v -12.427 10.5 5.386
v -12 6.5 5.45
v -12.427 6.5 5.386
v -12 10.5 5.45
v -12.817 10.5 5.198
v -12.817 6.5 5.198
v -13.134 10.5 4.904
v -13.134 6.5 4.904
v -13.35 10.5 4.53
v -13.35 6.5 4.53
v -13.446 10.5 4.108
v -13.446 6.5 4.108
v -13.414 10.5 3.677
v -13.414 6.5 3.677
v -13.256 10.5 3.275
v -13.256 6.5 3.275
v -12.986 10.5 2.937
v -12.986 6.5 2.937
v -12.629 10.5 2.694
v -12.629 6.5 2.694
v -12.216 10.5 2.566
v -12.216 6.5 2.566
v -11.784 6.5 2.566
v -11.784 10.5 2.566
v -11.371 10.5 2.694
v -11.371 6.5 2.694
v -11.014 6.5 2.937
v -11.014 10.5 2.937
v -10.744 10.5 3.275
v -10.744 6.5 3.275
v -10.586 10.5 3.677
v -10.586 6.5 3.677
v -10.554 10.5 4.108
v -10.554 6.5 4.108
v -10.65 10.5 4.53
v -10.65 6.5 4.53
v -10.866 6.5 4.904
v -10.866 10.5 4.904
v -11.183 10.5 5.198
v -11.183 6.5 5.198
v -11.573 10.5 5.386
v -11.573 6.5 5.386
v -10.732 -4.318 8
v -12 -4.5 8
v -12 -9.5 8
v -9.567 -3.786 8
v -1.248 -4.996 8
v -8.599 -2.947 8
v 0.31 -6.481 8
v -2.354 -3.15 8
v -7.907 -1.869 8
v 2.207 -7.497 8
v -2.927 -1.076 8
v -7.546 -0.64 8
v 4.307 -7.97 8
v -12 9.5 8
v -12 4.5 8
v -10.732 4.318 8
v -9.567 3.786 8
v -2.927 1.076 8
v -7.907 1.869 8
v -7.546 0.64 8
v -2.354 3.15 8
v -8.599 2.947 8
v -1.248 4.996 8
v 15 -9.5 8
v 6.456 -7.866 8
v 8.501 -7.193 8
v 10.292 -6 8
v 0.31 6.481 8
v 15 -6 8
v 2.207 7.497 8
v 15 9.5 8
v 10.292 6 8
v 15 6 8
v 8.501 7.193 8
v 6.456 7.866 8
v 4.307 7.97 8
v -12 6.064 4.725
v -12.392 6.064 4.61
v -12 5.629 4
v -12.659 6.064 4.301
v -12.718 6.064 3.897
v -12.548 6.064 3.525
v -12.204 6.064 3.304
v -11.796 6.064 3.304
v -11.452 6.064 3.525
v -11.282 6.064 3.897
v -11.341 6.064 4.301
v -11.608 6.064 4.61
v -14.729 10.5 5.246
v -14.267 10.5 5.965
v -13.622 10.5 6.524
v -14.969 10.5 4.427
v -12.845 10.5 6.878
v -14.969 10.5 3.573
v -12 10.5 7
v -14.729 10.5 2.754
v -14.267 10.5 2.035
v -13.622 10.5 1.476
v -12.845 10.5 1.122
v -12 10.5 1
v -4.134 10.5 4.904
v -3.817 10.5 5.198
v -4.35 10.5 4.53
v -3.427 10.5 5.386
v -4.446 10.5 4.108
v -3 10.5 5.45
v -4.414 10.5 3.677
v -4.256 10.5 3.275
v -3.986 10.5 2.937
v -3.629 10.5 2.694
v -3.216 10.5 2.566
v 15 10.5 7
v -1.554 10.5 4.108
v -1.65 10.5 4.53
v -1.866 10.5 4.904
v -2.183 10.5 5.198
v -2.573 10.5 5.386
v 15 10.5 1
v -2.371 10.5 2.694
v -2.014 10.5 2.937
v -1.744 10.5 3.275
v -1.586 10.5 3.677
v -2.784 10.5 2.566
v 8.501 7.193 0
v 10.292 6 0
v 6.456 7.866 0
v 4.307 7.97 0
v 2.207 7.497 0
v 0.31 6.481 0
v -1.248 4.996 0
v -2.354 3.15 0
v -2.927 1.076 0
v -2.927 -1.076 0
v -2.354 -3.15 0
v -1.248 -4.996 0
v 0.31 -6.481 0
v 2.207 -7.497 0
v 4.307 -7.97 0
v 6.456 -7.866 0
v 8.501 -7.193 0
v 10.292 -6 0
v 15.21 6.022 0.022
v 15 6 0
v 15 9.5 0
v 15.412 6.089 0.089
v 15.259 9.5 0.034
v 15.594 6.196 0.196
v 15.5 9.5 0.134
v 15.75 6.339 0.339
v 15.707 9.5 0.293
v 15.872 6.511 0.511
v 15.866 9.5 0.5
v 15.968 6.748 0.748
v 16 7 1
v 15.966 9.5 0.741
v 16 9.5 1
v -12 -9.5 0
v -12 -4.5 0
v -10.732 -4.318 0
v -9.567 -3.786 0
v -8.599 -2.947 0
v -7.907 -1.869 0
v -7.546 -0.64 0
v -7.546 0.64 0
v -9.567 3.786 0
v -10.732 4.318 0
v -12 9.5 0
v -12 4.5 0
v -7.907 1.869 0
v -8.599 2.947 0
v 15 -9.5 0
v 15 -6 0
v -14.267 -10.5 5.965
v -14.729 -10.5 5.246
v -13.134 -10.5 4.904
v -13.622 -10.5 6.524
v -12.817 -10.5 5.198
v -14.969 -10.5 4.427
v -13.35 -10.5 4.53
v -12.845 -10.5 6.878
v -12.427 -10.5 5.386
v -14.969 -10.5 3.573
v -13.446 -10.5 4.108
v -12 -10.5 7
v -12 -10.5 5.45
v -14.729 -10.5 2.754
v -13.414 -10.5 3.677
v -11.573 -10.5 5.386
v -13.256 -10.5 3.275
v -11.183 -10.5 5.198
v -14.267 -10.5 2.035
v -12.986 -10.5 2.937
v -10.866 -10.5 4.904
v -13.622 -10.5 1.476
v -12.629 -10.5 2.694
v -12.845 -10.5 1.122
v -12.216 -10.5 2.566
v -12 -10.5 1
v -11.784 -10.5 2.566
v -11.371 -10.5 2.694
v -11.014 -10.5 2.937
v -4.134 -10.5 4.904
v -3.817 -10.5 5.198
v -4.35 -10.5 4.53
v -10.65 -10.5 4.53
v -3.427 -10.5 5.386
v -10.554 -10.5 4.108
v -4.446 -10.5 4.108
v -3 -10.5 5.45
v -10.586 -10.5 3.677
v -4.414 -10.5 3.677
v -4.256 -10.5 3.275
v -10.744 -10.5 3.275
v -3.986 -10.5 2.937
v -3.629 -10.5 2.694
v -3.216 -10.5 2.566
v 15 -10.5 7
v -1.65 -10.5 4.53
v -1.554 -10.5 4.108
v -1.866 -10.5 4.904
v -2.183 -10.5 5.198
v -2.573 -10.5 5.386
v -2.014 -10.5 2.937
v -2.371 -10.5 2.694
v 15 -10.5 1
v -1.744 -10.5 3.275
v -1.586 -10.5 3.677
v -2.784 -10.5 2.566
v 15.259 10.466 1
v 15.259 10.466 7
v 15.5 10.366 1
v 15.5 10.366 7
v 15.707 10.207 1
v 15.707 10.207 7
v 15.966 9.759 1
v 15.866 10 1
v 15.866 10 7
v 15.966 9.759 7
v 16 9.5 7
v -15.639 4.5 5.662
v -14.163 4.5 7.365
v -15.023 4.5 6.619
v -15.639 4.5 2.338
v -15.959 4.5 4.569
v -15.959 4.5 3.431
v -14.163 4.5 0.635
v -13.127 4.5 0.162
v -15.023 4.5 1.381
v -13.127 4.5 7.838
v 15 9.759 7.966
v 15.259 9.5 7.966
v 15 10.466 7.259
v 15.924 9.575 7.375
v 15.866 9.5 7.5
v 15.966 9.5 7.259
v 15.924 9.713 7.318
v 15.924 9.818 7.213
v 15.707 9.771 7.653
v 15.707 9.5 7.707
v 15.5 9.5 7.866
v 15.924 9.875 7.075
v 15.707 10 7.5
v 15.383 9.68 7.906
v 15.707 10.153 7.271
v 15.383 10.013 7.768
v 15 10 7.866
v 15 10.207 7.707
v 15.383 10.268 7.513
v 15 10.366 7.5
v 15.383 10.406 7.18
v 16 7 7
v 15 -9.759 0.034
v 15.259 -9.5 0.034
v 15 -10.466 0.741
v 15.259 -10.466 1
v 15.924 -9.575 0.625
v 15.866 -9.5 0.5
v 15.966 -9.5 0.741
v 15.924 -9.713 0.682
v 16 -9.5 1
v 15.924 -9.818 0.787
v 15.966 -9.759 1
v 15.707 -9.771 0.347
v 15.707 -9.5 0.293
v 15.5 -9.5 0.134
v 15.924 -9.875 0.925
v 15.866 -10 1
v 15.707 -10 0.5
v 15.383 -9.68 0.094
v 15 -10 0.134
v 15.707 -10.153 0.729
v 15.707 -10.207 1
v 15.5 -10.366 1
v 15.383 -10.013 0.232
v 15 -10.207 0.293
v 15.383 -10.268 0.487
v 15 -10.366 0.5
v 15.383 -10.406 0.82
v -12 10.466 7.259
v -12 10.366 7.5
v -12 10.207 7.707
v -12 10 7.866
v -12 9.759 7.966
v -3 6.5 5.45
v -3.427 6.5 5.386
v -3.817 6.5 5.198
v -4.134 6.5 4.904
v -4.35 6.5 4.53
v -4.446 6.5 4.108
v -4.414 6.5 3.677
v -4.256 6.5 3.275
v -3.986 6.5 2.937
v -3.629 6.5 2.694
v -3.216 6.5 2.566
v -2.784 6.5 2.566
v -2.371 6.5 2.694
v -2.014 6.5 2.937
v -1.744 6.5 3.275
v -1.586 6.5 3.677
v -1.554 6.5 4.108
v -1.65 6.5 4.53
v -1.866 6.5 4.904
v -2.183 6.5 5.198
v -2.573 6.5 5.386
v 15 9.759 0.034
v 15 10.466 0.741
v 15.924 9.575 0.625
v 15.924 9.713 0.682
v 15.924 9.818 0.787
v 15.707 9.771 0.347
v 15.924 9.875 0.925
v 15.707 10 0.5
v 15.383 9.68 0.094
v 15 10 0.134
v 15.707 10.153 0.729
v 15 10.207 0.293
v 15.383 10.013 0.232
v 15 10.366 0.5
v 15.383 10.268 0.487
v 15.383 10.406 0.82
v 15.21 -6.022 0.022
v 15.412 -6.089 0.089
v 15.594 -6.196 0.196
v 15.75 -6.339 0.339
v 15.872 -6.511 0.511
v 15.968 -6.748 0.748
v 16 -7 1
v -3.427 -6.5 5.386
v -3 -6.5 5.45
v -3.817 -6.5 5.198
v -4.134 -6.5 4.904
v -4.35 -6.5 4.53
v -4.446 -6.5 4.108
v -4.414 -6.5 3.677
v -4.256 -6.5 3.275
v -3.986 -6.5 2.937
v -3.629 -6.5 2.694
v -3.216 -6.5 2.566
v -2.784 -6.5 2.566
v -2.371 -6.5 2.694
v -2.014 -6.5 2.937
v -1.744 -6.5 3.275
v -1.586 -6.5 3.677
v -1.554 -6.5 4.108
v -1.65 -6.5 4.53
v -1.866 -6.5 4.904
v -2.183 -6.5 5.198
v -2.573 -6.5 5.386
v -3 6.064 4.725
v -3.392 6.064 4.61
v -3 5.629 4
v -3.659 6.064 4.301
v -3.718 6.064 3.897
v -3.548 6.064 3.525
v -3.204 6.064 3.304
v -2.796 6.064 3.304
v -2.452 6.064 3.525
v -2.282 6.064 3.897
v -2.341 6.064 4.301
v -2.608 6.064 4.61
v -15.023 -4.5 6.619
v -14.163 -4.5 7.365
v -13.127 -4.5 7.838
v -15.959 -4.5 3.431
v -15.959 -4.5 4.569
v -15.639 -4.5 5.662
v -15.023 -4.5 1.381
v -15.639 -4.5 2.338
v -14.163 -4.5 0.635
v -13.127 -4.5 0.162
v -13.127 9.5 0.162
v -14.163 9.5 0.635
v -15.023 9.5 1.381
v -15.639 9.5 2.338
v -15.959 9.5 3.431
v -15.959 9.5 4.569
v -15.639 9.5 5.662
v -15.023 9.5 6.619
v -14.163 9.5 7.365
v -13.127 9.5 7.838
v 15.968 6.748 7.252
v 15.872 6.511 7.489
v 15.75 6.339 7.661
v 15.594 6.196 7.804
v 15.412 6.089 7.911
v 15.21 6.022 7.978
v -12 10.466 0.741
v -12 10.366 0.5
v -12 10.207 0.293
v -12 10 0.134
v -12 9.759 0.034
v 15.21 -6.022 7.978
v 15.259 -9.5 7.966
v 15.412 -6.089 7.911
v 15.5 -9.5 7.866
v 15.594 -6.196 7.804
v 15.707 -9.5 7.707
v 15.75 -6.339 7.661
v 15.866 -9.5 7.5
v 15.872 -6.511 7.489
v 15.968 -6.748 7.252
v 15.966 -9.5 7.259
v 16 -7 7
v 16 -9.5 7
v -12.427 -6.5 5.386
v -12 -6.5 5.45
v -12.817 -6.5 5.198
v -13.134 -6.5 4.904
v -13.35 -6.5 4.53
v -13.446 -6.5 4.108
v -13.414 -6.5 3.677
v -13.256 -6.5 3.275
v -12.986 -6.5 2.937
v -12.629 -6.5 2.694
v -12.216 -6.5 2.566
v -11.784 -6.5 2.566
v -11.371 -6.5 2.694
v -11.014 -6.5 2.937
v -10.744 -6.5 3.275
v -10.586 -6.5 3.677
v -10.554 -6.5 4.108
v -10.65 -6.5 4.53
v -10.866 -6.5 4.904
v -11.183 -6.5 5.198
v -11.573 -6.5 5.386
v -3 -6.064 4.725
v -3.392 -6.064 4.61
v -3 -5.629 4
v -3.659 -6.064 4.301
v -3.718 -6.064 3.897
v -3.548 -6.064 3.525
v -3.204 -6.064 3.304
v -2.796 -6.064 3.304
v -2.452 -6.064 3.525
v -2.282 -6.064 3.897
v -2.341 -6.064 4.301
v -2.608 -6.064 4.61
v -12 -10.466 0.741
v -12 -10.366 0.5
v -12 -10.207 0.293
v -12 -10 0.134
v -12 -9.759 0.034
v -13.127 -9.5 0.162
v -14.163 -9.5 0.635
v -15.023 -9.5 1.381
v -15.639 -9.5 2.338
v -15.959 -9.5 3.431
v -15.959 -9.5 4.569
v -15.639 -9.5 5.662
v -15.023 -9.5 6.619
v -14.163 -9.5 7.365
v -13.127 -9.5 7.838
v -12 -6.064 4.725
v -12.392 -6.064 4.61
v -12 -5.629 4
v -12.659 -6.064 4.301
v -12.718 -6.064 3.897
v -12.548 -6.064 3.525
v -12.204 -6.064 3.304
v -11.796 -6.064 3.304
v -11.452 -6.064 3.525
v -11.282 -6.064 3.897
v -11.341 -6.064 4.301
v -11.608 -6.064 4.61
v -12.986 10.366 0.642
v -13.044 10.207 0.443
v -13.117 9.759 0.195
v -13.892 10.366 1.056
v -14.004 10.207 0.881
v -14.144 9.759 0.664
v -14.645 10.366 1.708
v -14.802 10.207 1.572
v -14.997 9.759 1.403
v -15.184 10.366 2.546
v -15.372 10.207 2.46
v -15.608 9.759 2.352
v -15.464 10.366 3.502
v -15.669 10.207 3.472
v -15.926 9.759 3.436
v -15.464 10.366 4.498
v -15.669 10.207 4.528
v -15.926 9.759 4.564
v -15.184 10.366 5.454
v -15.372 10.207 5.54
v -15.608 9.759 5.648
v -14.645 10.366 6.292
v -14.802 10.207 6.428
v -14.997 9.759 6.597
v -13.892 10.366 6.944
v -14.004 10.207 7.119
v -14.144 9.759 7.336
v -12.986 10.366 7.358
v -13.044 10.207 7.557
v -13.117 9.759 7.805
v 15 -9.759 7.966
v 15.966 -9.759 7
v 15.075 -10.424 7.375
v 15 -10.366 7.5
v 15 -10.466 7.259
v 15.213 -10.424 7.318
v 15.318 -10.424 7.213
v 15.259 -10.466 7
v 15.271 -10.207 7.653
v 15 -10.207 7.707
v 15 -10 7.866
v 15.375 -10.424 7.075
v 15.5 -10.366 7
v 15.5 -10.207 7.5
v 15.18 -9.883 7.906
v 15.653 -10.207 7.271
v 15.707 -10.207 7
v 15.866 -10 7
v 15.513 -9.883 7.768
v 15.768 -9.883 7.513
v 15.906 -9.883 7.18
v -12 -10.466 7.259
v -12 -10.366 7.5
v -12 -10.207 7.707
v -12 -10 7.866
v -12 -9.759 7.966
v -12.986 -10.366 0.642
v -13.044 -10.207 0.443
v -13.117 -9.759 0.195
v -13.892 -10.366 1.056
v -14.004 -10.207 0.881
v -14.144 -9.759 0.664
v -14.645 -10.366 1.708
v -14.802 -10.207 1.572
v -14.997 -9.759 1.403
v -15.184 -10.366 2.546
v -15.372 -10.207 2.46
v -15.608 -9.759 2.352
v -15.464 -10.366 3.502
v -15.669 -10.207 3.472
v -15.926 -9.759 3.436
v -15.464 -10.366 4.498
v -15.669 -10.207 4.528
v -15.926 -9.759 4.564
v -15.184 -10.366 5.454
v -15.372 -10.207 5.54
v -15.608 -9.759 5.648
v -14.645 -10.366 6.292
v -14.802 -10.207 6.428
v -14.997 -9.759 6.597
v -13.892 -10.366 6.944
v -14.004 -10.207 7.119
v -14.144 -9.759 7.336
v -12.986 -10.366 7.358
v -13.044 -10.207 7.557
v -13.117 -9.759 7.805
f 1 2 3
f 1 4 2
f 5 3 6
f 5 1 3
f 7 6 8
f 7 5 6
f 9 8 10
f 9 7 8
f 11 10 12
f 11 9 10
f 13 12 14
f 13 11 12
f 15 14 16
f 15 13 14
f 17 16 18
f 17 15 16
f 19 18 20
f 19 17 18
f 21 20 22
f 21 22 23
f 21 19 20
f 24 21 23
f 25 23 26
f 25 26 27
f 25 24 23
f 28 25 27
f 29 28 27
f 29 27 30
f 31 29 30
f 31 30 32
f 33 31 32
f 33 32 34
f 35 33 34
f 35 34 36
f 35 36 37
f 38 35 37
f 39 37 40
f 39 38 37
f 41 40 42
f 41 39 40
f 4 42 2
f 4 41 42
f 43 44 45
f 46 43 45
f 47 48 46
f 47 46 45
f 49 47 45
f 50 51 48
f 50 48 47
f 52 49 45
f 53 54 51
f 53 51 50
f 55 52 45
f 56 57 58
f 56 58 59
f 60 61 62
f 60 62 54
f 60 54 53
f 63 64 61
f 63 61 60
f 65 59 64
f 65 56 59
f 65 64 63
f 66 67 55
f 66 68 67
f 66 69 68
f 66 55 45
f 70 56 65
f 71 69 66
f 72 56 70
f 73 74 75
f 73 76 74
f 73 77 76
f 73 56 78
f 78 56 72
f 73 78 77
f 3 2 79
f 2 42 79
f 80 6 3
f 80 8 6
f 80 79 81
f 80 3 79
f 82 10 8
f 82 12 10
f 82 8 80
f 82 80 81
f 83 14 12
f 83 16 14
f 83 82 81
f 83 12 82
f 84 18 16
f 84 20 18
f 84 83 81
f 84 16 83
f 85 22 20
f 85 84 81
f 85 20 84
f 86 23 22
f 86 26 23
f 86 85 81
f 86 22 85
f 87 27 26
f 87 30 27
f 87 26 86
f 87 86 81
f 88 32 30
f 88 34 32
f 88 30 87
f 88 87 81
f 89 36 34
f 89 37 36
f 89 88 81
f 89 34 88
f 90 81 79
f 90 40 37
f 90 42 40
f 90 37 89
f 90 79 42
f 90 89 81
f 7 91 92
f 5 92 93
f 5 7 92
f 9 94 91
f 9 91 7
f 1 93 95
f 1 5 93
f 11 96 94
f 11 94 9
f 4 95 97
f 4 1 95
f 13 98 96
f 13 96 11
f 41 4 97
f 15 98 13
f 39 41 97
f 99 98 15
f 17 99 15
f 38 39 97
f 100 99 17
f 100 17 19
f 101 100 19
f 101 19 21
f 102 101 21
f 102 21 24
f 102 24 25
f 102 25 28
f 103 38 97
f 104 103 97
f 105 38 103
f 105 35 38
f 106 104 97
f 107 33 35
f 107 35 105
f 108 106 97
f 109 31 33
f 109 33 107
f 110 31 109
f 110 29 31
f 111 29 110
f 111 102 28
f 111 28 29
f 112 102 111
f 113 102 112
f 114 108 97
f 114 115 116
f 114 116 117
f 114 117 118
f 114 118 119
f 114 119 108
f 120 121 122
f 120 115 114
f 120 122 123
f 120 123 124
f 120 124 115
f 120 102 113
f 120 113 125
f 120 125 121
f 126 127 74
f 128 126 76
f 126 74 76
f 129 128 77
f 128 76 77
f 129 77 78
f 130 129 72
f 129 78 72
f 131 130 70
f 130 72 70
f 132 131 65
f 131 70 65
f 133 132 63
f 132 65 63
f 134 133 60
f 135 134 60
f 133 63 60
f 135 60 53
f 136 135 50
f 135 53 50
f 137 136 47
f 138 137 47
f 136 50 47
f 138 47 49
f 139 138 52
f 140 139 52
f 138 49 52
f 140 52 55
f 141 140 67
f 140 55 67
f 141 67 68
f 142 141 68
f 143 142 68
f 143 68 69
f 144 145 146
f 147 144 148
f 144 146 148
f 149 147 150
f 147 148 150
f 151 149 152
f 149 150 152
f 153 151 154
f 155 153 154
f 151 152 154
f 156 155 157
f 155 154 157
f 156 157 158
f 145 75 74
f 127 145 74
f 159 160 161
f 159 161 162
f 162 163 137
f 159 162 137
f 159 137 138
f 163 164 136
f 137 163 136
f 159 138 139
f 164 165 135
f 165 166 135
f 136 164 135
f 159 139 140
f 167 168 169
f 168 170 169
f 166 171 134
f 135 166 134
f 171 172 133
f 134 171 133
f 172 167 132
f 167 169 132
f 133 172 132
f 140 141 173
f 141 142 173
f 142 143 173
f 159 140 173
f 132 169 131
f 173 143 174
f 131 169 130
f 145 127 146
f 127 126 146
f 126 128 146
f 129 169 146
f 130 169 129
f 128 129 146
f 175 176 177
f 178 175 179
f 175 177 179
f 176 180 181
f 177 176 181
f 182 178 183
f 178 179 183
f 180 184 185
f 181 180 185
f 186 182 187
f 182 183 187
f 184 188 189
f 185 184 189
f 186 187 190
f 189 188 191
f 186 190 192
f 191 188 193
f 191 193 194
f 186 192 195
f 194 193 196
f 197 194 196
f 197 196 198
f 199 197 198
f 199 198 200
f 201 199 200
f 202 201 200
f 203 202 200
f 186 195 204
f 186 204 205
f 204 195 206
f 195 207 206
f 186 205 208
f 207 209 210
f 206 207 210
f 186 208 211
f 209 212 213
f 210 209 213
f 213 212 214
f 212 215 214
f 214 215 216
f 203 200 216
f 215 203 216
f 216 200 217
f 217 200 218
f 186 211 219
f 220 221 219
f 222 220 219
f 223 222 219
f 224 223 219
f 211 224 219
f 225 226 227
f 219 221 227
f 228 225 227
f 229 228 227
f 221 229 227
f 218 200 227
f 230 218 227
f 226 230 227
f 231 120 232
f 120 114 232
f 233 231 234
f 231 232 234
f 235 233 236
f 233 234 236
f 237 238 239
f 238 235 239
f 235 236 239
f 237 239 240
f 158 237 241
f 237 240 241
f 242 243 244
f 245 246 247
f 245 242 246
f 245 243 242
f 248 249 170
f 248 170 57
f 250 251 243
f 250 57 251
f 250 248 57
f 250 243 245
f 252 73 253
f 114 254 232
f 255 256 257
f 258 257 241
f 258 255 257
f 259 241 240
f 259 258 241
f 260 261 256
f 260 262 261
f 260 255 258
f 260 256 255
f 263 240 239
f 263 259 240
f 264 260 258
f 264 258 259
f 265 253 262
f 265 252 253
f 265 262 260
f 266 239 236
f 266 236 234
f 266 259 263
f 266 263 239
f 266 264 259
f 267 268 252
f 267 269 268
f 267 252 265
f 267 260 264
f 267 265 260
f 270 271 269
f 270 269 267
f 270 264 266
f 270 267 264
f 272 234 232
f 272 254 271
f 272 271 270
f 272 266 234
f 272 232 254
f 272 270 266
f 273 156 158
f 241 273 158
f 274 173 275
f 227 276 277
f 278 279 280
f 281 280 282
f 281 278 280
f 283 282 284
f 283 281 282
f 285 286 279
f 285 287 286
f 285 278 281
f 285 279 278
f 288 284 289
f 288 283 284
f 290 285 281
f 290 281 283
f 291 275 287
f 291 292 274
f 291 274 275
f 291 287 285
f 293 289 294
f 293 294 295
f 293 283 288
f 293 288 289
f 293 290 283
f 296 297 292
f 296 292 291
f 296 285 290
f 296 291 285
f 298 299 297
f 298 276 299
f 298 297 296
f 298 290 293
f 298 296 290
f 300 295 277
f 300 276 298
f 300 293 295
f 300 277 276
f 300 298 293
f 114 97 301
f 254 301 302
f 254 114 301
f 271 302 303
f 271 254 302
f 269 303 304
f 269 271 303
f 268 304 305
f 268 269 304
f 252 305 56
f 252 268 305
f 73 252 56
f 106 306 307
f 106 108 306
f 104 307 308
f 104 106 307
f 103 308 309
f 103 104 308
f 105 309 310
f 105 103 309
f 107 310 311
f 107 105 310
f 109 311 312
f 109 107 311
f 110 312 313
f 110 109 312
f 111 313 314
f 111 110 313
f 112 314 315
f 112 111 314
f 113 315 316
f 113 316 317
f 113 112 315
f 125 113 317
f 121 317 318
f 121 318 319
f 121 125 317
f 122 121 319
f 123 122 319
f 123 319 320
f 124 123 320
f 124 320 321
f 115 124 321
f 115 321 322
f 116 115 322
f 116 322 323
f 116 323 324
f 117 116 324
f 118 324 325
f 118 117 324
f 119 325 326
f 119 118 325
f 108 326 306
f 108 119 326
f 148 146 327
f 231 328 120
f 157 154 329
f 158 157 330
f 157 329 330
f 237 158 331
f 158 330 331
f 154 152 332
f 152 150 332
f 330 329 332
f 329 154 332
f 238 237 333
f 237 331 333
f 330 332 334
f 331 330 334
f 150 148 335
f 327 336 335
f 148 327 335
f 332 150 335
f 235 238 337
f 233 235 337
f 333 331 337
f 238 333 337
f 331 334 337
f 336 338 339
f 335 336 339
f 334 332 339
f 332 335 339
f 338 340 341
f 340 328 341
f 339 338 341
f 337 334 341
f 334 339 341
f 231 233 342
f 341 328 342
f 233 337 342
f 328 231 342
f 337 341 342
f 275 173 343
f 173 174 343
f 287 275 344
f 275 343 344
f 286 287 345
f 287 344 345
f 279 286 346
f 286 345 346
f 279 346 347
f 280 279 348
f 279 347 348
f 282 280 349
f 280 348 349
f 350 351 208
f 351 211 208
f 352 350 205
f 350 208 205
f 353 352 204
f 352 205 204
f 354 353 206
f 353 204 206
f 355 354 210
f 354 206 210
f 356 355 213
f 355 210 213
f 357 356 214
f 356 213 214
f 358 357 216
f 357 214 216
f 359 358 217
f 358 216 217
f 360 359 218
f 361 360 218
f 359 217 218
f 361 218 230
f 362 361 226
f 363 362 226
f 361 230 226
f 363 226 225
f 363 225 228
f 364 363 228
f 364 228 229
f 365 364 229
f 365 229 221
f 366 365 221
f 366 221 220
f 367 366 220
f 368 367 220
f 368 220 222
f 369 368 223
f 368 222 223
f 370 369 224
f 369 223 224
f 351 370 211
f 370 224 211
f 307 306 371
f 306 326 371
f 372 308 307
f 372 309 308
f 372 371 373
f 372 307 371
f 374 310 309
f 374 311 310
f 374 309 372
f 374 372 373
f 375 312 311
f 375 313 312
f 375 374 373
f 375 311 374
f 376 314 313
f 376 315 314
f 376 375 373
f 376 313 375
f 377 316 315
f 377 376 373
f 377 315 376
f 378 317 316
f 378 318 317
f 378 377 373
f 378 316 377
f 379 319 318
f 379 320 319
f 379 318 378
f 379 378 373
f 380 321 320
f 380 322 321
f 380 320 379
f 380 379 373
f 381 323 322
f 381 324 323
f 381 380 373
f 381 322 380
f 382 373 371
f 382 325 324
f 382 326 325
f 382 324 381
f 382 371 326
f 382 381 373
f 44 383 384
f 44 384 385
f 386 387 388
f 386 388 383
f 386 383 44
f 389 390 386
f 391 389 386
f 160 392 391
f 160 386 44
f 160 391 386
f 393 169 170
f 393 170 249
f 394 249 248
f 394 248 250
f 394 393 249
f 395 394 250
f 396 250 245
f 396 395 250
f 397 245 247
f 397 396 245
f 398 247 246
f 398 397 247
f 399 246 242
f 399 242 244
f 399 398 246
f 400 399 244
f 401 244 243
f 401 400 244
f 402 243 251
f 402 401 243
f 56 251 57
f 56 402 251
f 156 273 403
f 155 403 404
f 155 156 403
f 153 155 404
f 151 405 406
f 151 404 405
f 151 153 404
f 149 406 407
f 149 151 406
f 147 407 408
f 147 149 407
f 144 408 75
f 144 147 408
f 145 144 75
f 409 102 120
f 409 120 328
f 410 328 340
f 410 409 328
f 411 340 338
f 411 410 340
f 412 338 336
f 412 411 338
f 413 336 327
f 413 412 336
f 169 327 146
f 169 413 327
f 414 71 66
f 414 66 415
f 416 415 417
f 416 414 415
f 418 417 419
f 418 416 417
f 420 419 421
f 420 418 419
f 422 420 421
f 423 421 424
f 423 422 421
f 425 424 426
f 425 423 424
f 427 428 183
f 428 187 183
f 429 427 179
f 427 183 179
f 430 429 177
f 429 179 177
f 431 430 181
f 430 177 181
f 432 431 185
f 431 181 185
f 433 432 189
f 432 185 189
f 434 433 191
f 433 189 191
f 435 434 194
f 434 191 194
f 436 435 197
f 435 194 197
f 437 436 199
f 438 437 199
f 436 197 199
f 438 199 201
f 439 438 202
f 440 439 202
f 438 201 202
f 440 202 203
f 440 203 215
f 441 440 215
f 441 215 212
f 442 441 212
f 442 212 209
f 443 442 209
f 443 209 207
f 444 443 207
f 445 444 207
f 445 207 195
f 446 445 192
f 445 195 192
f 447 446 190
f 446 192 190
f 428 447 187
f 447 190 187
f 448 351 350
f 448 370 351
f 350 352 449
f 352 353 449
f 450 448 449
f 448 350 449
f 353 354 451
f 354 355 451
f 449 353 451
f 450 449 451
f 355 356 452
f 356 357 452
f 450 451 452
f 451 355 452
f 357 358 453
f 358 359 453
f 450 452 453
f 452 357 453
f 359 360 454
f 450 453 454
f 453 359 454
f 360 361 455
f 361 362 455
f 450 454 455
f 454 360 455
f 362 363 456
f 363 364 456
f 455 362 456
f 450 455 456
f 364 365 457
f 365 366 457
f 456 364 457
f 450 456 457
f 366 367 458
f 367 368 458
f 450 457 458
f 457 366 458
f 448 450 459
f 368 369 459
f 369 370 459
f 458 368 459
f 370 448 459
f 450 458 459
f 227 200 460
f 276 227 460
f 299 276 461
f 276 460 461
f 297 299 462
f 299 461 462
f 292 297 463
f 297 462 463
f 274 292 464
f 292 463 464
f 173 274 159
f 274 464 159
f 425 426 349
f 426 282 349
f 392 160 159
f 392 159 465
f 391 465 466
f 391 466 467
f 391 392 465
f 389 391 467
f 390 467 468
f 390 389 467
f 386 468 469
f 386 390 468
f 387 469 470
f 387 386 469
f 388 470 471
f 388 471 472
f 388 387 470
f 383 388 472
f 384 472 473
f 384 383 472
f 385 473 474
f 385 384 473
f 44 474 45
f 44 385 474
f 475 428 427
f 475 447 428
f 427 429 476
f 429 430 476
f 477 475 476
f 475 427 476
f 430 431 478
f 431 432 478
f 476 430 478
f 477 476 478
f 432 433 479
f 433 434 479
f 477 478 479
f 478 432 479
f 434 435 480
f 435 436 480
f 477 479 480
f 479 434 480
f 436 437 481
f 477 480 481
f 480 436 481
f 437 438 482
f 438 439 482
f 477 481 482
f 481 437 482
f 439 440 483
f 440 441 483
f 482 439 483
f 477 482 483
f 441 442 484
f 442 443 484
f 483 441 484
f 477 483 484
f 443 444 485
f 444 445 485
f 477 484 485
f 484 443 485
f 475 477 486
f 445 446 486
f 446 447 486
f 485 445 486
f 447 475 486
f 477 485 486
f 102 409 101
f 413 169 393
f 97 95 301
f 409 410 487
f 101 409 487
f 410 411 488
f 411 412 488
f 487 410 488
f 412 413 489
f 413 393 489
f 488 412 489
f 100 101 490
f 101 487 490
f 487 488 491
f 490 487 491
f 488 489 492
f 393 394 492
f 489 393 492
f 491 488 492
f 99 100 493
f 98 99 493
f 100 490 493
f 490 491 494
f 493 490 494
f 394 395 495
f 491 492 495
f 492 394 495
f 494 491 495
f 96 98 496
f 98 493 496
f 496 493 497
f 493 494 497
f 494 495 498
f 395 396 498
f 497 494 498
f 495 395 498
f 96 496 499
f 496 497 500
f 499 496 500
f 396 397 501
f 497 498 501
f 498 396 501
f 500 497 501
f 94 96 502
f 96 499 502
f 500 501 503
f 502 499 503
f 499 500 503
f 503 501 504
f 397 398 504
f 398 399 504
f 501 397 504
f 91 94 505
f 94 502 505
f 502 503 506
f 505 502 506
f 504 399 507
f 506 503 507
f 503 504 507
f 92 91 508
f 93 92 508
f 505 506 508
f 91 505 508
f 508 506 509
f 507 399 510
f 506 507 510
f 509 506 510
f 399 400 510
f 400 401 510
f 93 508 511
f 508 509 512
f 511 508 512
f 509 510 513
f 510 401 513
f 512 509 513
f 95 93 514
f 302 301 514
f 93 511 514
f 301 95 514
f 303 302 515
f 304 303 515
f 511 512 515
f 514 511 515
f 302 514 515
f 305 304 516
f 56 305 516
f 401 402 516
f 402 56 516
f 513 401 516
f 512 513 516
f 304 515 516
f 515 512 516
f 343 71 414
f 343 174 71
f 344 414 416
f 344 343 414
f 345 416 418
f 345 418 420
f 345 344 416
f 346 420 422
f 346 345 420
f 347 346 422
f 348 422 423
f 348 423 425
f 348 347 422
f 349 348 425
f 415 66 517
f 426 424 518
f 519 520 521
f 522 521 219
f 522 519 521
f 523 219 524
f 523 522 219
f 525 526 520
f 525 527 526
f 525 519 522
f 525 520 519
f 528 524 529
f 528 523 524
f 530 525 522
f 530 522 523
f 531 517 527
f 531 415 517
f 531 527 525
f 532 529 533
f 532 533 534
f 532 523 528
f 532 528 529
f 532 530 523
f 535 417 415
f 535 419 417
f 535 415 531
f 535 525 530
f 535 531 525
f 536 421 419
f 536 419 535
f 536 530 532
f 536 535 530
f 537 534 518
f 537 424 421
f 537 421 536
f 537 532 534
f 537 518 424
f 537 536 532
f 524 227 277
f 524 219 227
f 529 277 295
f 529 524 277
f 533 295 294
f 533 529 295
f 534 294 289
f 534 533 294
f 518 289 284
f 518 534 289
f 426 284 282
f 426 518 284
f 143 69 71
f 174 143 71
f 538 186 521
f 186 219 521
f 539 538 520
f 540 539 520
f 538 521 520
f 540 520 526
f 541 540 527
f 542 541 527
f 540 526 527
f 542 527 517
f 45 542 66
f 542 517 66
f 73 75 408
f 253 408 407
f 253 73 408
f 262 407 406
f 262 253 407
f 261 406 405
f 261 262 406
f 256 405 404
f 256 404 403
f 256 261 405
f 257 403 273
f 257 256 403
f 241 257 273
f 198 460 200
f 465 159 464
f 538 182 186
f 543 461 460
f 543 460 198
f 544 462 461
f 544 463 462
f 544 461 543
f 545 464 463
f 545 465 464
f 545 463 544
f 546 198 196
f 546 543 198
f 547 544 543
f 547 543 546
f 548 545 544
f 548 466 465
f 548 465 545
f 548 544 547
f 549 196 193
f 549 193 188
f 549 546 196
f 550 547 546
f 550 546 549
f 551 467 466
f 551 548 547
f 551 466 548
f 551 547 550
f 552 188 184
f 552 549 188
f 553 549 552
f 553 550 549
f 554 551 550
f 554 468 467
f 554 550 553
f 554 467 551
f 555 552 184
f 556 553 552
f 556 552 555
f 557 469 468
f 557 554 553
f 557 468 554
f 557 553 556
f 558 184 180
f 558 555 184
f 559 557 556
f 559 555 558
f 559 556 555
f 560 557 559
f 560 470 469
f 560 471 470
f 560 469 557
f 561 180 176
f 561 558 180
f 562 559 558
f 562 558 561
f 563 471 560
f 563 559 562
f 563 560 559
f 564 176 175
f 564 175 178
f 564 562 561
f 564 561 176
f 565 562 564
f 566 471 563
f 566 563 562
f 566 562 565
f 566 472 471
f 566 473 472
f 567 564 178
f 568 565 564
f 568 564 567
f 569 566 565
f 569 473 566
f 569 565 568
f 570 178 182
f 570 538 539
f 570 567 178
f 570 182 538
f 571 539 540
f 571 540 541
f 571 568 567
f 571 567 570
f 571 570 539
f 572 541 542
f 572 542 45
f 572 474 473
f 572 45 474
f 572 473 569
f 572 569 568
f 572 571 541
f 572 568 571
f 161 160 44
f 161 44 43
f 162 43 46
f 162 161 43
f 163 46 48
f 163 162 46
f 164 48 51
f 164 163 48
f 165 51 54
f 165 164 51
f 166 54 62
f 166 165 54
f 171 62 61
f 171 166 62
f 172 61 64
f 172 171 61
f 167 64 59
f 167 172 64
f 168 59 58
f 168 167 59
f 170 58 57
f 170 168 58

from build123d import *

# Parameters (mm, degrees)
SKETCH1_W                       = 32
SKETCH1_H                       = 21
BOSS_EXTRUDE1_DEPTH             = 8
FILLET1_RADIUS                  = 4
FILLET1_LENGTH                  = 21
CUT_EXTRUDE1_REACH              = 22.742
M2_5_CLEARANCE_HOLE1_AT_2_COUNT = 2
M2_5_CLEARANCE_HOLE1_AT_2_PITCH = 9
FILLET2_R                       = 1
CUT_EXTRUDE2_REACH              = 22.742


with BuildPart() as part:
    # Sketch1 → Boss-Extrude1 (new body)
    with BuildSketch(Plane.XY):
        Rectangle(SKETCH1_W, SKETCH1_H)
    extrude(amount=BOSS_EXTRUDE1_DEPTH)

    # Fillet1: full round fillet: the end face becomes a half cylinder, R = half its width
    fillet1_face = Plane((-16, 0, 4), x_dir=(0, 1, 0), z_dir=(-1, 0, 0))  # on the end face: x along it, z out of the body
    fillet1_slab = fillet1_face.offset(-FILLET1_RADIUS / 2) * Box(FILLET1_LENGTH, 2 * FILLET1_RADIUS, FILLET1_RADIUS, mode=Mode.PRIVATE)  # the body's end, R deep
    fillet1_round = Plane((-12, 0, 4), x_dir=(-1, 0, 0), z_dir=(0, 1, 0)) * Cylinder(FILLET1_RADIUS, FILLET1_LENGTH, mode=Mode.PRIVATE)  # its axis R under the face
    add(fillet1_slab - fillet1_round, mode=Mode.SUBTRACT)

    # Sketch2 → Cut-Extrude1 (cut, up to next)
    with BuildSketch(Plane.XY.offset(8), mode=Mode.PRIVATE) as cut_extrude1_sk1:
        with BuildLine():
            Line((16, 6), (10.291502622, 6))
            ThreePointArc((10.291502622, 6), (-3, 0), (10.291502622, -6))
            Line((10.291502622, -6), (16, -6))
            Line((16, -6), (16, 6))
        make_face()
    cut_extrude1_tool1 = extrude(cut_extrude1_sk1.sketch, amount=-CUT_EXTRUDE1_REACH, mode=Mode.PRIVATE) & part.part
    add(cut_extrude1_tool1.solids().sort_by_distance((6.675863, 0, 8))[0], mode=Mode.SUBTRACT)

    # Sketch5 → M2.5 Clearance Hole1 (revolve, cut)
    with BuildSketch(Plane(origin=(-12, 10.5, 4), x_dir=(0, 0, 1), z_dir=(1, 0, 0))):
        Polygon((0, 0), (0, 4.871247898), (1.45, 4), (1.45, 0), align=None)
    m2_5_clearance_hole1 = revolve(axis=Axis((-12, 16.85, 4), (0, -1, 0)), mode=Mode.SUBTRACT)

    # M2.5 Clearance Hole1 at 2: M2.5 Clearance Hole1 ×2
    with Locations(*[(i * M2_5_CLEARANCE_HOLE1_AT_2_PITCH, 0, 0) for i in range(1, M2_5_CLEARANCE_HOLE1_AT_2_COUNT)]):
        add(m2_5_clearance_hole1, mode=Mode.SUBTRACT)

    # Fillet2
    fillet2_edges = [part.edges().sort_by_distance(p)[0] for p in [
        (16, -8.25, 8),
        (2, 10.5, 8),
        (2, -10.5, 8),
        (2, -10.5, 0),
        (-16, 10.5, 4),
        (-16, -10.5, 4),
        (16, 8.25, 0),
        (16, 8.25, 8),
        (16, 6, 4),
        (16, -6, 4),
        (2, 10.5, 0),
        (16, -8.25, 0),
        (16, 10.5, 4),
        (16, -10.5, 4),
    ]]
    fillet(fillet2_edges, radius=FILLET2_R)

    # Mirror1: M2.5 Clearance Hole1 across plane
    add(m2_5_clearance_hole1.mirror(Plane.ZX), mode=Mode.SUBTRACT)

    # Mirror1 copy 1 sketch → Mirror1 copy 1 (revolve, cut)
    with BuildSketch(Plane(origin=(-3, -10.5, 4), x_dir=(0, 0, 1), z_dir=(1, 0, 0))):
        Polygon((0, 0), (0, -4.871247898), (1.45, -4), (1.45, 0), align=None)
    revolve(axis=Axis((-3, -16.85, 4), (0, -1, 0)), mode=Mode.SUBTRACT)

    # Sketch6 → Cut-Extrude2 (cut, up to next)
    with BuildSketch(Plane.XY, mode=Mode.PRIVATE) as cut_extrude2_sk1:
        with BuildLine():
            Line((-12, 4.5), (-16, 4.5))
            Line((-16, 4.5), (-16, -4.5))
            Line((-16, -4.5), (-12, -4.5))
            ThreePointArc((-12, -4.5), (-7.5, 0), (-12, 4.5))
        make_face()
    cut_extrude2_tool1 = extrude(cut_extrude2_sk1.sketch, amount=CUT_EXTRUDE2_REACH, mode=Mode.PRIVATE) & part.part
    add(cut_extrude2_tool1.solids().sort_by_distance((-12.165908, 0, 0))[0], mode=Mode.SUBTRACT)


solid = part.part
